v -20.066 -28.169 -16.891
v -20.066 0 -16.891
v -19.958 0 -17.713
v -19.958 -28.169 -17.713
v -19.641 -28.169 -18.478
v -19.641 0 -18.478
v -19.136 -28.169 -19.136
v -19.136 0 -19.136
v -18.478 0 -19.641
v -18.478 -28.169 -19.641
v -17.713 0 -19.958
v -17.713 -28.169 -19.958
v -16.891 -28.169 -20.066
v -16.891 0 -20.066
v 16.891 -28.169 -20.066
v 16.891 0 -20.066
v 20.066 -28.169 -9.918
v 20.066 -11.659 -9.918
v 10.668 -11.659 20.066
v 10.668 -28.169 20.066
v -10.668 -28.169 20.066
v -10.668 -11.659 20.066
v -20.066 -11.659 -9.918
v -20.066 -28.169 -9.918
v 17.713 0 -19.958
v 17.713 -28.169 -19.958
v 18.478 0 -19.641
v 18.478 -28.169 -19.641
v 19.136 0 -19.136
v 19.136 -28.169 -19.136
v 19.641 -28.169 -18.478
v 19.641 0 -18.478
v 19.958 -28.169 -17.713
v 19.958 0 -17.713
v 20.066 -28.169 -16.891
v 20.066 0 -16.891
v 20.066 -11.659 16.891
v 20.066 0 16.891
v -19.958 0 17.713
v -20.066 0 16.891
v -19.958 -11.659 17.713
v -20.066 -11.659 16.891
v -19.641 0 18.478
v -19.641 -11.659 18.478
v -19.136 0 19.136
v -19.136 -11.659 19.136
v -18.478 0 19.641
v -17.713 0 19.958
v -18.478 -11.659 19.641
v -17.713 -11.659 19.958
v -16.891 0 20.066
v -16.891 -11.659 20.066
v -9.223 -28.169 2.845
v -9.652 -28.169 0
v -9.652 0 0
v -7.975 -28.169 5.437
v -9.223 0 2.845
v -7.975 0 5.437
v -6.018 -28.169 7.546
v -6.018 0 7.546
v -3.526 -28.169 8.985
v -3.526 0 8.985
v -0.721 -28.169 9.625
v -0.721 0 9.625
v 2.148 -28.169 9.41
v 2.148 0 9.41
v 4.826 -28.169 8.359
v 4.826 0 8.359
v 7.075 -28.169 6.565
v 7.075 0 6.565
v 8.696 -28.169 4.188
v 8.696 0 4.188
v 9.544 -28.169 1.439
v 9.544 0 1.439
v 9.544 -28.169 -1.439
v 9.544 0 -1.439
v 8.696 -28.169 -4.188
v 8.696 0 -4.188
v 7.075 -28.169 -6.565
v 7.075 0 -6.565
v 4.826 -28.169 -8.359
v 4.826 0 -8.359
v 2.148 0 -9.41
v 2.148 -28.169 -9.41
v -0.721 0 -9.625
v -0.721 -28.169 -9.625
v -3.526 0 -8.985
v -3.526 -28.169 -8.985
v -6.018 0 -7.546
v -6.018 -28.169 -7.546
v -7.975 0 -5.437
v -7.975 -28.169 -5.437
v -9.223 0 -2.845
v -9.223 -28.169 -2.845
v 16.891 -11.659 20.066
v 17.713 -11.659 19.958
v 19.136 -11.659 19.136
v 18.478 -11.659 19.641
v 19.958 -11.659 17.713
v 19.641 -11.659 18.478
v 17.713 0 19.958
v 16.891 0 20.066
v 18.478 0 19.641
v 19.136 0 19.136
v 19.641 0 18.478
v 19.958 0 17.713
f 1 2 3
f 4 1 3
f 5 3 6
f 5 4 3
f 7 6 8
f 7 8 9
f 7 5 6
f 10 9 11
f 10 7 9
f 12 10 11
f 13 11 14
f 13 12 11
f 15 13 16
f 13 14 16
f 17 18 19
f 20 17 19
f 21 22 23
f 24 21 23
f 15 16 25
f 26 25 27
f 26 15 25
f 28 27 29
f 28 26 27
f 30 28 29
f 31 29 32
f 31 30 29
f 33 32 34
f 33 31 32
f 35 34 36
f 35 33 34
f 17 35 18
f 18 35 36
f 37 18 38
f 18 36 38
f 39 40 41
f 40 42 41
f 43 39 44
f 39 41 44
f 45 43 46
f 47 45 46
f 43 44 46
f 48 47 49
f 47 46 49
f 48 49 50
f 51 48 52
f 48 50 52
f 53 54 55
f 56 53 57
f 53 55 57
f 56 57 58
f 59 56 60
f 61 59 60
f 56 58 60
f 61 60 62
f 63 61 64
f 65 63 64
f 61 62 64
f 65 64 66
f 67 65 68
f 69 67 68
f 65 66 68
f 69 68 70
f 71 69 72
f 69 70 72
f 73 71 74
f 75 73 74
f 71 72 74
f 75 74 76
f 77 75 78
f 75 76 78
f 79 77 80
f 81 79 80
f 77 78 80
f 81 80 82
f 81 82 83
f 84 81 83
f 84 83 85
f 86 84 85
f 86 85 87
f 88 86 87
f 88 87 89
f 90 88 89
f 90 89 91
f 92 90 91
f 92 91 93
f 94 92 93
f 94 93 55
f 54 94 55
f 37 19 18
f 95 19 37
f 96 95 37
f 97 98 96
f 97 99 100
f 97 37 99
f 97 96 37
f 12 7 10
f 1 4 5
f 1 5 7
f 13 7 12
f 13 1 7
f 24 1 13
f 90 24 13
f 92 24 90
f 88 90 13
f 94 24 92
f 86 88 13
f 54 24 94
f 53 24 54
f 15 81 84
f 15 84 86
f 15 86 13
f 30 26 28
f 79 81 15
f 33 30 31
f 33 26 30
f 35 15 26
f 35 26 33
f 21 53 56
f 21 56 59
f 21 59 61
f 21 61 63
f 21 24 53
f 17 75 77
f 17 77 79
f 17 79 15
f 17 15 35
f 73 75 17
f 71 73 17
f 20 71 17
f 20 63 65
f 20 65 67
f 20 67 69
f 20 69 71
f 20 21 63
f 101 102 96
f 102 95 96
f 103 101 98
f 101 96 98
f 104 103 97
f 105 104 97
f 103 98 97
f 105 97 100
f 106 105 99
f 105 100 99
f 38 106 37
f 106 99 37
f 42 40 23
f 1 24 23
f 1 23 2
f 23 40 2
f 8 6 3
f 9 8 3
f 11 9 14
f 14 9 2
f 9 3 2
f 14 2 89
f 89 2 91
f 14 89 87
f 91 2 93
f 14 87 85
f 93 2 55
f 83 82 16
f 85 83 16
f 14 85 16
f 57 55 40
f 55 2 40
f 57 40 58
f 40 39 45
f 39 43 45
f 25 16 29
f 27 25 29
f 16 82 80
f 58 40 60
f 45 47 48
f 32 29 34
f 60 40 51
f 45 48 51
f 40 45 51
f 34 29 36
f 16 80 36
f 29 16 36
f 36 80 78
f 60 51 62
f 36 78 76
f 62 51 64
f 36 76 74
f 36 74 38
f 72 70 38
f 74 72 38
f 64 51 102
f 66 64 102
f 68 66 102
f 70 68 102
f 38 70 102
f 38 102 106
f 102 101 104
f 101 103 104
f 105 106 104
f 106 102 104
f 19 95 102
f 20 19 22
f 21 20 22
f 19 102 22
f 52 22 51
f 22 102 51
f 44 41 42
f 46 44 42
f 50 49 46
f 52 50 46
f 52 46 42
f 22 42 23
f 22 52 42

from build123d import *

# Parameters (mm, degrees)
F0_W     = 40.132
F0_H     = 40.132
F1_DEPTH = 11.6586
F3_DEPTH = 16.51
F4_R     = 9.652
F5_DEPTH = 30.48
F6_R     = 3.175
F7_R     = 3.175
F8_R     = 3.175


with BuildPart() as f1:
    # F0 (on Front) → F1 (new body)
    with BuildSketch(Plane.XZ):
        Rectangle(F0_W, F0_H)
    extrude(amount=F1_DEPTH)

    # F2 (on face) → F3 (join)
    with BuildSketch(Plane.XZ.offset(11.6586)):
        Polygon((-20.066, -9.918316), (-20.066, -20.066), (20.066, -20.066), (20.066, -9.918316), (10.668, 20.066), (-10.668, 20.066), align=None)
    extrude(amount=F3_DEPTH)

    # F4 (on face) → F5 (cut)
    with BuildSketch(Plane(origin=(0, 0, 0), x_dir=(-1, 0, 0), z_dir=(0, 1, 0))):
        Circle(F4_R)
    extrude(amount=-F5_DEPTH, mode=Mode.SUBTRACT)

    # F6
    f6_edges = [f1.edges().sort_by_distance(p)[0] for p in [
        (-20.066, -5.8293, 20.066),
    ]]
    fillet(f6_edges, radius=F6_R)

    # F7
    f7_edges = [f1.edges().sort_by_distance(p)[0] for p in [
        (-20.066, -14.0843, -20.066),
    ]]
    fillet(f7_edges, radius=F7_R)

    # F8
    f8_edges = [f1.edges().sort_by_distance(p)[0] for p in [
        (20.066, -5.8293, 20.066),
        (20.066, -14.0843, -20.066),
    ]]
    fillet(f8_edges, radius=F8_R)


solid = f1.part
